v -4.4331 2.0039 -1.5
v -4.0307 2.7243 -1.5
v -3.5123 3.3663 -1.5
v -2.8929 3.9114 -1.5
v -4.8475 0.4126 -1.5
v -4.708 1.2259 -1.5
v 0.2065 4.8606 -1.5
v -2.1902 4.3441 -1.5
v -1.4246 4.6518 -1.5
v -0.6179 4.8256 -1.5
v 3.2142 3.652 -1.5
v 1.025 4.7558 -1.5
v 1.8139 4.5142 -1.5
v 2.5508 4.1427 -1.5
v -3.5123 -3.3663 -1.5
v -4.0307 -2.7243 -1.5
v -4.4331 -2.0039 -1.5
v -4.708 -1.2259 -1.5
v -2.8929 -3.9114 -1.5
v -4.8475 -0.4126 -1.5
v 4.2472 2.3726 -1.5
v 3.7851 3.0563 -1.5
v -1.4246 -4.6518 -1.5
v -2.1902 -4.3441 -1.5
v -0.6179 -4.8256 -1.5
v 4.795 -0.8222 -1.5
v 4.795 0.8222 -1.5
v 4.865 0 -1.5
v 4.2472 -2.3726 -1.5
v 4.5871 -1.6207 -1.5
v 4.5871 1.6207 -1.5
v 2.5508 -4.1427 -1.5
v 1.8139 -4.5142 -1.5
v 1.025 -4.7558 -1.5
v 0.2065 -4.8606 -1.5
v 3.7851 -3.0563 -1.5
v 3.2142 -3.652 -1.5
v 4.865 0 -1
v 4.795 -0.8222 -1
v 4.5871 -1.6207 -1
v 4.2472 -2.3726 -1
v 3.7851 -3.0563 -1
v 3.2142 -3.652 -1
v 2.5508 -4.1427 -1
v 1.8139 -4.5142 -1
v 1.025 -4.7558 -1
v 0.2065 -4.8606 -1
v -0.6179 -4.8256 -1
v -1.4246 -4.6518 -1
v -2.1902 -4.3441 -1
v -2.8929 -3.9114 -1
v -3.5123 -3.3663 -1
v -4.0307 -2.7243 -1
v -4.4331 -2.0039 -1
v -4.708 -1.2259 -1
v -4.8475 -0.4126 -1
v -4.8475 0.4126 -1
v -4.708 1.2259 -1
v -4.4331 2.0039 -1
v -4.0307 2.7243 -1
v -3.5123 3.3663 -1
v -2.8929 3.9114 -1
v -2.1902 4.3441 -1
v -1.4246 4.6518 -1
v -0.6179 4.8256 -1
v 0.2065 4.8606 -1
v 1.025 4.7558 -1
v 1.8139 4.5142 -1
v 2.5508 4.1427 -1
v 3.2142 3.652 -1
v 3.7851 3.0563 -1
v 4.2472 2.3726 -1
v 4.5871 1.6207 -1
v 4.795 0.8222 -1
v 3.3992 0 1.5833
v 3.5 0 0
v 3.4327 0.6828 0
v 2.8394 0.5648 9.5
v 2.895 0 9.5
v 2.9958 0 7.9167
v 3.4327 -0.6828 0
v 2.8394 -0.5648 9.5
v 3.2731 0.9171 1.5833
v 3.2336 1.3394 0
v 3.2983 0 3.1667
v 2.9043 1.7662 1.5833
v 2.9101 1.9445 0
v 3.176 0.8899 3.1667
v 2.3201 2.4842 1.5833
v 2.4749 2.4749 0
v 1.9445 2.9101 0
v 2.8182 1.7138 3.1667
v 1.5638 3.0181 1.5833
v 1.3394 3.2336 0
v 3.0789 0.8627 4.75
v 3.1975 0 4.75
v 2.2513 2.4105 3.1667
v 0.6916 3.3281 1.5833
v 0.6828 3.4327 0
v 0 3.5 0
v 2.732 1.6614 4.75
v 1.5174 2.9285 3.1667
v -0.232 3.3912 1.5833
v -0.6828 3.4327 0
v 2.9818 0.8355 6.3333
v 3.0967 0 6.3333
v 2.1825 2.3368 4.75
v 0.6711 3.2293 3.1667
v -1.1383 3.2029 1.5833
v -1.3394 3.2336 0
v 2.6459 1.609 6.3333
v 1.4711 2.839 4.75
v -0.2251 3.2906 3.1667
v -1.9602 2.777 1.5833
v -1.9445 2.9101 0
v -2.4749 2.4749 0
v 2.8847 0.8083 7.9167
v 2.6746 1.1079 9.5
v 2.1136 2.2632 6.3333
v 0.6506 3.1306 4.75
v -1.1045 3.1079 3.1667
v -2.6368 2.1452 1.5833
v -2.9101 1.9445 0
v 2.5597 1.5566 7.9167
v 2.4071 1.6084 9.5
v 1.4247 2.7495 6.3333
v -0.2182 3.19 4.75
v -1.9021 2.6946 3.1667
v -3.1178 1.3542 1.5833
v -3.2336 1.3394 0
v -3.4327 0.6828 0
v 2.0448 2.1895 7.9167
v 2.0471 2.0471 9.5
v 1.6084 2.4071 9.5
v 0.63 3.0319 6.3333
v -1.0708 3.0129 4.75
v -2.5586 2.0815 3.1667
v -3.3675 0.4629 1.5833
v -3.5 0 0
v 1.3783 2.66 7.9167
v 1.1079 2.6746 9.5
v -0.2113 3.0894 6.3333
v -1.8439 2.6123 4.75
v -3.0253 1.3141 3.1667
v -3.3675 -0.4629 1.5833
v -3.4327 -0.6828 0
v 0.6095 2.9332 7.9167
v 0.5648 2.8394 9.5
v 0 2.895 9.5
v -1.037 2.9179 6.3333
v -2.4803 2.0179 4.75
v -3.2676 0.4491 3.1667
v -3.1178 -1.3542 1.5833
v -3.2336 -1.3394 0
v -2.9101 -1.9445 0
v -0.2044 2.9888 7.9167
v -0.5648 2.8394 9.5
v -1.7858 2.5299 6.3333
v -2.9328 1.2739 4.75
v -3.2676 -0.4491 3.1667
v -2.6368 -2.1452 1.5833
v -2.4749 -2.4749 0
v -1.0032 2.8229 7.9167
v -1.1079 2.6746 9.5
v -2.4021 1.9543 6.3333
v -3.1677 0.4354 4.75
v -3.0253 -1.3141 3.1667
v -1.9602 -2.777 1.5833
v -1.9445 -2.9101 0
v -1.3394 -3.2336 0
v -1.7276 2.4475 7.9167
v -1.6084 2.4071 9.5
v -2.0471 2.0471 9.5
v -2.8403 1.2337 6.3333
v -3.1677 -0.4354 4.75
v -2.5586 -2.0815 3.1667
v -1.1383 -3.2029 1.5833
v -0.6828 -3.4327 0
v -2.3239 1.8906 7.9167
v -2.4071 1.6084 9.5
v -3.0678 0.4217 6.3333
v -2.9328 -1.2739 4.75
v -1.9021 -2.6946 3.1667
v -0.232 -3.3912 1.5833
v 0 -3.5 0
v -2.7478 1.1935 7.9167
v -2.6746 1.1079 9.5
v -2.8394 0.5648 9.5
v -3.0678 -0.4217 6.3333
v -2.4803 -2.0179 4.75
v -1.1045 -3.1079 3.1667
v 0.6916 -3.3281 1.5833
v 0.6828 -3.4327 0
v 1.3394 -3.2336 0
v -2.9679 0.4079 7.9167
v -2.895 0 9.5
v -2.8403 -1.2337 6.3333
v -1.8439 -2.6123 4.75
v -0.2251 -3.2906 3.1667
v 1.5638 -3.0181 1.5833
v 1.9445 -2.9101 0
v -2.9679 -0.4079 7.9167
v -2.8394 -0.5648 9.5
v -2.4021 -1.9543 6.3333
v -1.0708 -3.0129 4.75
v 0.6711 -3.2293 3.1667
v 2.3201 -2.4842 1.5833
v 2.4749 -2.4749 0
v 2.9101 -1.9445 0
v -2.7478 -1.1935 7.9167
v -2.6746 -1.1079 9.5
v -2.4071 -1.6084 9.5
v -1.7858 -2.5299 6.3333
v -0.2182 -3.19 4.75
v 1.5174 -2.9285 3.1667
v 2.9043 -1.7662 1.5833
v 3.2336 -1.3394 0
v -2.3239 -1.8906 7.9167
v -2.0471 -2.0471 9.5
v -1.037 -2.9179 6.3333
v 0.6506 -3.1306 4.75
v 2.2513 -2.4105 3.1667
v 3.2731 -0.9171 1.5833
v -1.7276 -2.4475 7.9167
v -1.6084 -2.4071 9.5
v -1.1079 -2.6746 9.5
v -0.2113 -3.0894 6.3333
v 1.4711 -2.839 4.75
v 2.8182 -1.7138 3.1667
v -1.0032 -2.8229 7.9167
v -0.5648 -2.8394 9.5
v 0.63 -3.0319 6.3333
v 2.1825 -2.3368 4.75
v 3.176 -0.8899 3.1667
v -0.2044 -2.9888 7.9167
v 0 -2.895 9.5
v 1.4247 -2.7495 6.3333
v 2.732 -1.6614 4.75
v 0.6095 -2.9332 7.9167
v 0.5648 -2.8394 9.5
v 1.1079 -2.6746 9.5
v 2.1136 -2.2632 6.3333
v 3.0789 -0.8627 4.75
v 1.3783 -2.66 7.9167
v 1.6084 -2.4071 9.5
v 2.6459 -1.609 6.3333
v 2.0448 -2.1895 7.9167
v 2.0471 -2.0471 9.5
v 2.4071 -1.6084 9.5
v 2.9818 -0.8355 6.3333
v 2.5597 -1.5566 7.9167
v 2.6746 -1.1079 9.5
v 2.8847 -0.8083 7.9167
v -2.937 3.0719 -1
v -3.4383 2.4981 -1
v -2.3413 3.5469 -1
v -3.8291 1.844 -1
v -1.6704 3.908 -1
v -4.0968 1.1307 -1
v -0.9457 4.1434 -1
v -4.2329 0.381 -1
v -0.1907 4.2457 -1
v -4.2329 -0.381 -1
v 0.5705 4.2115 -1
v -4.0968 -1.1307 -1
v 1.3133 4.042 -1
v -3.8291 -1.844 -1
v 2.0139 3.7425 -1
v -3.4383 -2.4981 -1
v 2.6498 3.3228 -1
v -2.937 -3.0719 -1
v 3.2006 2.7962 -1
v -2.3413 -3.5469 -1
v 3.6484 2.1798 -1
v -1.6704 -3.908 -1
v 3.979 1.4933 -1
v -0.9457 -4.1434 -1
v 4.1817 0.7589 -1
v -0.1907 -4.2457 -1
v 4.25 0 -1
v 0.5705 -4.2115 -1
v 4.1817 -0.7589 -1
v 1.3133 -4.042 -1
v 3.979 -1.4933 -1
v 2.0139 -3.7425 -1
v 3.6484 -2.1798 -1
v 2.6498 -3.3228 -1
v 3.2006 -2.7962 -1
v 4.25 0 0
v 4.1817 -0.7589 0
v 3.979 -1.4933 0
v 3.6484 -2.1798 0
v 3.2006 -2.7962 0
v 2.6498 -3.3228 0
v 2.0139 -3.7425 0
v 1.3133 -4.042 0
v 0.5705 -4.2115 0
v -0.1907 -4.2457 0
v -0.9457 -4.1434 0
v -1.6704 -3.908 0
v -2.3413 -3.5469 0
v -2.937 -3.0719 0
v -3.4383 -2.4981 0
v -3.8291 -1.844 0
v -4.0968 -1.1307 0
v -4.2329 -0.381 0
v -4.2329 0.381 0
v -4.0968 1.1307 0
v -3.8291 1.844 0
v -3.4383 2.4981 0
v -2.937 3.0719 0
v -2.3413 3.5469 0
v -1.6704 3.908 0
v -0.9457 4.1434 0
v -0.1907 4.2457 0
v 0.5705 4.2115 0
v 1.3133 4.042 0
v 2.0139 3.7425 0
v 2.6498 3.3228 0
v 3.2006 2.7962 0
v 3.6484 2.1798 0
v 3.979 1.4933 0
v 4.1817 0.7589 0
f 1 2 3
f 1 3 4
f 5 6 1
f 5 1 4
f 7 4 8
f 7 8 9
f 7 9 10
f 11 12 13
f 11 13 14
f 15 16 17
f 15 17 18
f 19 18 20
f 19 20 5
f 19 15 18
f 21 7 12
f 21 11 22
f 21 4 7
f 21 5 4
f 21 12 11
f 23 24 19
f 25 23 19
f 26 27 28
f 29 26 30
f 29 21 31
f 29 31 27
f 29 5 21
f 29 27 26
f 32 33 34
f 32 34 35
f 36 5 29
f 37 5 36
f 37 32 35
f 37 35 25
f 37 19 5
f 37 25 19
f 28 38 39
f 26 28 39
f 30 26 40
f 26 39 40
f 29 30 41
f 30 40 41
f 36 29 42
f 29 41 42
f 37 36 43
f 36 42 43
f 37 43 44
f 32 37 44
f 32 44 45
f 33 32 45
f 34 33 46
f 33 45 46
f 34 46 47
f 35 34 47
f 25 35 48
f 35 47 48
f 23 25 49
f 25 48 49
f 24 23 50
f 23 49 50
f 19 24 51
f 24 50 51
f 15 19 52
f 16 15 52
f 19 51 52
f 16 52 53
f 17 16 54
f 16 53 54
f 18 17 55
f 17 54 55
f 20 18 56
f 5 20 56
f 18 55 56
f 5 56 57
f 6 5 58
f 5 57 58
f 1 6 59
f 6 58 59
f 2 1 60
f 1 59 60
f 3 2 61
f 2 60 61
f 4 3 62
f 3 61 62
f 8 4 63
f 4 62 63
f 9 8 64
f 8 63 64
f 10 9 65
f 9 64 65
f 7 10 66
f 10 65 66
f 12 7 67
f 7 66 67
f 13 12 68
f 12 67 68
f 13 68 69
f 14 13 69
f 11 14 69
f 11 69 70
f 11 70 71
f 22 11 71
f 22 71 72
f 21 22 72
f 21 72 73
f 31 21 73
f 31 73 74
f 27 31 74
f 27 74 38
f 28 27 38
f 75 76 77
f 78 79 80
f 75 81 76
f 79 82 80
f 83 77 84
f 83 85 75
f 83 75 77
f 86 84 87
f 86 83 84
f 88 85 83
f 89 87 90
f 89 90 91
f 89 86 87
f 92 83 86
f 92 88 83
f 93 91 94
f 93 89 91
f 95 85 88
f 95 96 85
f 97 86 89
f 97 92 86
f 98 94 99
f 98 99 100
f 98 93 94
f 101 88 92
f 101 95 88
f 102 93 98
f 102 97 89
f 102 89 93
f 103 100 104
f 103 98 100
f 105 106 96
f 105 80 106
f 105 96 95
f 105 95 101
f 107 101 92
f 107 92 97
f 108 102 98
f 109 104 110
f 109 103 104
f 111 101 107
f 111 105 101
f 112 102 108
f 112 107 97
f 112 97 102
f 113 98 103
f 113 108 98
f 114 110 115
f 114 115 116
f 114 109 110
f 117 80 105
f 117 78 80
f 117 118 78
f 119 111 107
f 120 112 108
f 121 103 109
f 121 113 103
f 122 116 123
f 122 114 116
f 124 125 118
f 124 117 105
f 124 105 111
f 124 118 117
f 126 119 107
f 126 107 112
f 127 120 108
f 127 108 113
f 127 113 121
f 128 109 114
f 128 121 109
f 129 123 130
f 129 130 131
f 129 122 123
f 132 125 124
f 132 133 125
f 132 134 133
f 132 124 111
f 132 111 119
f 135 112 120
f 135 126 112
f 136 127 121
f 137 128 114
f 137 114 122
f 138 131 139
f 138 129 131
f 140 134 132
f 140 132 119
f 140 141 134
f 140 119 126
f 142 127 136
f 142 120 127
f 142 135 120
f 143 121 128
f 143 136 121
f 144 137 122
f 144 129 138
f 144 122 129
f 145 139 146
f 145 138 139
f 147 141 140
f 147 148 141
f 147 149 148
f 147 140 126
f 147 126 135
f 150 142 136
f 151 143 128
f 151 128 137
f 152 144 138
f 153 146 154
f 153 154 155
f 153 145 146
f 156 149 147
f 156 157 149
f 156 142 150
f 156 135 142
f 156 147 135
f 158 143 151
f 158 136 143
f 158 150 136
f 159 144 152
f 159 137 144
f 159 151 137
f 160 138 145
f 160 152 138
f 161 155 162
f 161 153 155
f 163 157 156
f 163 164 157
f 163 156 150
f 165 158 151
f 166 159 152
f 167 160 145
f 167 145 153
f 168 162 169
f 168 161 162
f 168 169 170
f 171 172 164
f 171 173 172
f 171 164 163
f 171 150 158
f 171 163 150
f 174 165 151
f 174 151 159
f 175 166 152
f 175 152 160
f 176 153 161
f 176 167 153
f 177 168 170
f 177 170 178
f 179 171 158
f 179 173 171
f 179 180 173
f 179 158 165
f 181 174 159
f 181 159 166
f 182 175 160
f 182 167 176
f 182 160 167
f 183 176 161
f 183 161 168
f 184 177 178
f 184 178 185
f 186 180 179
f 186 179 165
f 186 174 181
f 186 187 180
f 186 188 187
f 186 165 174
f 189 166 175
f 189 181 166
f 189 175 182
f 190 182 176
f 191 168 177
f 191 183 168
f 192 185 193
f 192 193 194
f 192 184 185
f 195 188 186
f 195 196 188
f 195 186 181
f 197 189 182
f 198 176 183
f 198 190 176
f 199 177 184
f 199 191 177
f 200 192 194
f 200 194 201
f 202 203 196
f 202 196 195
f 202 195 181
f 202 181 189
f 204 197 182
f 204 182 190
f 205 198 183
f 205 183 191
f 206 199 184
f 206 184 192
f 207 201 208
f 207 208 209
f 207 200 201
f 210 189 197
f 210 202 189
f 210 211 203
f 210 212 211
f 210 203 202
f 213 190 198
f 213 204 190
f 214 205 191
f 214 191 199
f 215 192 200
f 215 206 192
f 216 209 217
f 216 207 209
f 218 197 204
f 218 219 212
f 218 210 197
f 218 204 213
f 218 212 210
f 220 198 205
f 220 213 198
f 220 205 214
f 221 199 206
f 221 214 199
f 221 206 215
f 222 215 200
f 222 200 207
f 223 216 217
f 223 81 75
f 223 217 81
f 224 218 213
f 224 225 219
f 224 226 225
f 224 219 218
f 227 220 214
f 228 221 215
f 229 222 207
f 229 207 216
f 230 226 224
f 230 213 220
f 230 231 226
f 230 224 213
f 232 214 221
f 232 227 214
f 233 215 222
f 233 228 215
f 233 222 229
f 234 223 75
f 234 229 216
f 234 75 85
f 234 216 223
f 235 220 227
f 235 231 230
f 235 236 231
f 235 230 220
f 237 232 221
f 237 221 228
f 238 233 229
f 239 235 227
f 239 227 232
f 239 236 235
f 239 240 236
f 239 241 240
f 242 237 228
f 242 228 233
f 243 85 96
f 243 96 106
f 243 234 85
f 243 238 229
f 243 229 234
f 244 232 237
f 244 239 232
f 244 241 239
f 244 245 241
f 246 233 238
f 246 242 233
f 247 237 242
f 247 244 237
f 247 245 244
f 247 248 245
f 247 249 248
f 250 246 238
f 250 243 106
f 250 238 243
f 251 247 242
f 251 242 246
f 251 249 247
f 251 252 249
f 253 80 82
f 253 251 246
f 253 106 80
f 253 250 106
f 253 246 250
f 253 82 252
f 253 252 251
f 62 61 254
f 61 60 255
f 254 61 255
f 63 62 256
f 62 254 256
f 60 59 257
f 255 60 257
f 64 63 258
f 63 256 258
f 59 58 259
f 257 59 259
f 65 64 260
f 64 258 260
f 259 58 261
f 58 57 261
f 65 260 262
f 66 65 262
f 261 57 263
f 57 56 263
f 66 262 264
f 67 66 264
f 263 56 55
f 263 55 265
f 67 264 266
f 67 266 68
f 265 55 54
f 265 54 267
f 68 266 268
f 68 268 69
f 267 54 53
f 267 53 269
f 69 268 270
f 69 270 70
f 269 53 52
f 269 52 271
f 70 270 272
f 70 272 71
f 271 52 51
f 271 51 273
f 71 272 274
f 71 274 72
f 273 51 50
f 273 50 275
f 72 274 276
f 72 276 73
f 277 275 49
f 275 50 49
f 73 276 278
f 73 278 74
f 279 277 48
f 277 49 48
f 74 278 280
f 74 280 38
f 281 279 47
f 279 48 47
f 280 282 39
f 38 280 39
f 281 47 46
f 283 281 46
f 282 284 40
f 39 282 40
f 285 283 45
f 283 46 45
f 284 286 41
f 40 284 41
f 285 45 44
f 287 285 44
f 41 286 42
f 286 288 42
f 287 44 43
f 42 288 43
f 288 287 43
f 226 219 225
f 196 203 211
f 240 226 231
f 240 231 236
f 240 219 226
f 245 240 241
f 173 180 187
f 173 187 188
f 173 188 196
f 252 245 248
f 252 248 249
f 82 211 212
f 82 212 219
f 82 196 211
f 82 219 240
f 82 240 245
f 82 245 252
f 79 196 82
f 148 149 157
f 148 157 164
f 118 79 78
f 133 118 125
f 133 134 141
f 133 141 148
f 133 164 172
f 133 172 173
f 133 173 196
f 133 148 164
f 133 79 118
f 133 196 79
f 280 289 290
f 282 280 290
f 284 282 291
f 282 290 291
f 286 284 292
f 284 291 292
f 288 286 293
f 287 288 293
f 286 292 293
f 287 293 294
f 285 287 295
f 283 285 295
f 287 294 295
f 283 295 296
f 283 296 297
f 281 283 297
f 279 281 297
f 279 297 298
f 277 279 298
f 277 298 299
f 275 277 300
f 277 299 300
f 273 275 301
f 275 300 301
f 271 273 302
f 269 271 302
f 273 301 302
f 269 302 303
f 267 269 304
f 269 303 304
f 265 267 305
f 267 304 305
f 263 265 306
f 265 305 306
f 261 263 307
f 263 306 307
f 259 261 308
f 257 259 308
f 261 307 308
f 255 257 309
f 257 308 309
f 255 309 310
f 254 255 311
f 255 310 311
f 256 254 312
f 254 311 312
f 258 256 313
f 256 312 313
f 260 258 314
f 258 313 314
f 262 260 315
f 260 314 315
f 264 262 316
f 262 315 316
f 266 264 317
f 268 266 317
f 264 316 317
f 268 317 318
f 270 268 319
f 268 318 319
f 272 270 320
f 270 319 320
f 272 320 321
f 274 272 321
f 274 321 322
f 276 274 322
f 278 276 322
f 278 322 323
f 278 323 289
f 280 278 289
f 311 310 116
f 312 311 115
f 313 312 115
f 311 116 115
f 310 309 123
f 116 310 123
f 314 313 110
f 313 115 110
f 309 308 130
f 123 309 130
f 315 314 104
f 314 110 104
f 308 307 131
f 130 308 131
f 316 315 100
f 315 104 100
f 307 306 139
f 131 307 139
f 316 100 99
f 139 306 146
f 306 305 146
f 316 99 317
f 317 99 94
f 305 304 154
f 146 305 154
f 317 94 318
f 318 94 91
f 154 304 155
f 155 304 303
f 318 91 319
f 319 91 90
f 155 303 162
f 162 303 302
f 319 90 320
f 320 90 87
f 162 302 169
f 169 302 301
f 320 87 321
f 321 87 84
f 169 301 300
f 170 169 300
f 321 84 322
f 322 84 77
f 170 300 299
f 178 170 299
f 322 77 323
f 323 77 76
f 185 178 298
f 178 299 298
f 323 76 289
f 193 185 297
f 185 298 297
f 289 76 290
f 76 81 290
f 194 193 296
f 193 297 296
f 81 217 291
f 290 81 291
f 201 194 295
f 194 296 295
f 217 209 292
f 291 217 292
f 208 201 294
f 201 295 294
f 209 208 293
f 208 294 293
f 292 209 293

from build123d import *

# Parameters (mm, degrees)
F0_R     = 3.5
F2_R     = 2.895
F4_R     = 4.25
F5_DEPTH = 1
F6_R     = 4.865
F7_DEPTH = 0.5


with BuildPart() as f3:
    # F0 (on Top) → F3 section 0
    with BuildSketch(Plane.XY):
        Circle(F0_R)
    # F2 (on offset) → F3 section 1
    with BuildSketch(Plane.XY.offset(9.5)):
        Circle(F2_R)
    loft()

    # F4 (on face) → F5 (join)
    with BuildSketch(Plane(origin=(0, 0, 0), x_dir=(1, 0, 0), z_dir=(0, 0, -1))):
        Circle(F4_R)
    extrude(amount=F5_DEPTH)

    # F6 (on face) → F7 (join)
    with BuildSketch(Plane(origin=(0, 0, -1), x_dir=(1, 0, 0), z_dir=(0, 0, -1))):
        Circle(F6_R)
    extrude(amount=F7_DEPTH)


solid = f3.part
